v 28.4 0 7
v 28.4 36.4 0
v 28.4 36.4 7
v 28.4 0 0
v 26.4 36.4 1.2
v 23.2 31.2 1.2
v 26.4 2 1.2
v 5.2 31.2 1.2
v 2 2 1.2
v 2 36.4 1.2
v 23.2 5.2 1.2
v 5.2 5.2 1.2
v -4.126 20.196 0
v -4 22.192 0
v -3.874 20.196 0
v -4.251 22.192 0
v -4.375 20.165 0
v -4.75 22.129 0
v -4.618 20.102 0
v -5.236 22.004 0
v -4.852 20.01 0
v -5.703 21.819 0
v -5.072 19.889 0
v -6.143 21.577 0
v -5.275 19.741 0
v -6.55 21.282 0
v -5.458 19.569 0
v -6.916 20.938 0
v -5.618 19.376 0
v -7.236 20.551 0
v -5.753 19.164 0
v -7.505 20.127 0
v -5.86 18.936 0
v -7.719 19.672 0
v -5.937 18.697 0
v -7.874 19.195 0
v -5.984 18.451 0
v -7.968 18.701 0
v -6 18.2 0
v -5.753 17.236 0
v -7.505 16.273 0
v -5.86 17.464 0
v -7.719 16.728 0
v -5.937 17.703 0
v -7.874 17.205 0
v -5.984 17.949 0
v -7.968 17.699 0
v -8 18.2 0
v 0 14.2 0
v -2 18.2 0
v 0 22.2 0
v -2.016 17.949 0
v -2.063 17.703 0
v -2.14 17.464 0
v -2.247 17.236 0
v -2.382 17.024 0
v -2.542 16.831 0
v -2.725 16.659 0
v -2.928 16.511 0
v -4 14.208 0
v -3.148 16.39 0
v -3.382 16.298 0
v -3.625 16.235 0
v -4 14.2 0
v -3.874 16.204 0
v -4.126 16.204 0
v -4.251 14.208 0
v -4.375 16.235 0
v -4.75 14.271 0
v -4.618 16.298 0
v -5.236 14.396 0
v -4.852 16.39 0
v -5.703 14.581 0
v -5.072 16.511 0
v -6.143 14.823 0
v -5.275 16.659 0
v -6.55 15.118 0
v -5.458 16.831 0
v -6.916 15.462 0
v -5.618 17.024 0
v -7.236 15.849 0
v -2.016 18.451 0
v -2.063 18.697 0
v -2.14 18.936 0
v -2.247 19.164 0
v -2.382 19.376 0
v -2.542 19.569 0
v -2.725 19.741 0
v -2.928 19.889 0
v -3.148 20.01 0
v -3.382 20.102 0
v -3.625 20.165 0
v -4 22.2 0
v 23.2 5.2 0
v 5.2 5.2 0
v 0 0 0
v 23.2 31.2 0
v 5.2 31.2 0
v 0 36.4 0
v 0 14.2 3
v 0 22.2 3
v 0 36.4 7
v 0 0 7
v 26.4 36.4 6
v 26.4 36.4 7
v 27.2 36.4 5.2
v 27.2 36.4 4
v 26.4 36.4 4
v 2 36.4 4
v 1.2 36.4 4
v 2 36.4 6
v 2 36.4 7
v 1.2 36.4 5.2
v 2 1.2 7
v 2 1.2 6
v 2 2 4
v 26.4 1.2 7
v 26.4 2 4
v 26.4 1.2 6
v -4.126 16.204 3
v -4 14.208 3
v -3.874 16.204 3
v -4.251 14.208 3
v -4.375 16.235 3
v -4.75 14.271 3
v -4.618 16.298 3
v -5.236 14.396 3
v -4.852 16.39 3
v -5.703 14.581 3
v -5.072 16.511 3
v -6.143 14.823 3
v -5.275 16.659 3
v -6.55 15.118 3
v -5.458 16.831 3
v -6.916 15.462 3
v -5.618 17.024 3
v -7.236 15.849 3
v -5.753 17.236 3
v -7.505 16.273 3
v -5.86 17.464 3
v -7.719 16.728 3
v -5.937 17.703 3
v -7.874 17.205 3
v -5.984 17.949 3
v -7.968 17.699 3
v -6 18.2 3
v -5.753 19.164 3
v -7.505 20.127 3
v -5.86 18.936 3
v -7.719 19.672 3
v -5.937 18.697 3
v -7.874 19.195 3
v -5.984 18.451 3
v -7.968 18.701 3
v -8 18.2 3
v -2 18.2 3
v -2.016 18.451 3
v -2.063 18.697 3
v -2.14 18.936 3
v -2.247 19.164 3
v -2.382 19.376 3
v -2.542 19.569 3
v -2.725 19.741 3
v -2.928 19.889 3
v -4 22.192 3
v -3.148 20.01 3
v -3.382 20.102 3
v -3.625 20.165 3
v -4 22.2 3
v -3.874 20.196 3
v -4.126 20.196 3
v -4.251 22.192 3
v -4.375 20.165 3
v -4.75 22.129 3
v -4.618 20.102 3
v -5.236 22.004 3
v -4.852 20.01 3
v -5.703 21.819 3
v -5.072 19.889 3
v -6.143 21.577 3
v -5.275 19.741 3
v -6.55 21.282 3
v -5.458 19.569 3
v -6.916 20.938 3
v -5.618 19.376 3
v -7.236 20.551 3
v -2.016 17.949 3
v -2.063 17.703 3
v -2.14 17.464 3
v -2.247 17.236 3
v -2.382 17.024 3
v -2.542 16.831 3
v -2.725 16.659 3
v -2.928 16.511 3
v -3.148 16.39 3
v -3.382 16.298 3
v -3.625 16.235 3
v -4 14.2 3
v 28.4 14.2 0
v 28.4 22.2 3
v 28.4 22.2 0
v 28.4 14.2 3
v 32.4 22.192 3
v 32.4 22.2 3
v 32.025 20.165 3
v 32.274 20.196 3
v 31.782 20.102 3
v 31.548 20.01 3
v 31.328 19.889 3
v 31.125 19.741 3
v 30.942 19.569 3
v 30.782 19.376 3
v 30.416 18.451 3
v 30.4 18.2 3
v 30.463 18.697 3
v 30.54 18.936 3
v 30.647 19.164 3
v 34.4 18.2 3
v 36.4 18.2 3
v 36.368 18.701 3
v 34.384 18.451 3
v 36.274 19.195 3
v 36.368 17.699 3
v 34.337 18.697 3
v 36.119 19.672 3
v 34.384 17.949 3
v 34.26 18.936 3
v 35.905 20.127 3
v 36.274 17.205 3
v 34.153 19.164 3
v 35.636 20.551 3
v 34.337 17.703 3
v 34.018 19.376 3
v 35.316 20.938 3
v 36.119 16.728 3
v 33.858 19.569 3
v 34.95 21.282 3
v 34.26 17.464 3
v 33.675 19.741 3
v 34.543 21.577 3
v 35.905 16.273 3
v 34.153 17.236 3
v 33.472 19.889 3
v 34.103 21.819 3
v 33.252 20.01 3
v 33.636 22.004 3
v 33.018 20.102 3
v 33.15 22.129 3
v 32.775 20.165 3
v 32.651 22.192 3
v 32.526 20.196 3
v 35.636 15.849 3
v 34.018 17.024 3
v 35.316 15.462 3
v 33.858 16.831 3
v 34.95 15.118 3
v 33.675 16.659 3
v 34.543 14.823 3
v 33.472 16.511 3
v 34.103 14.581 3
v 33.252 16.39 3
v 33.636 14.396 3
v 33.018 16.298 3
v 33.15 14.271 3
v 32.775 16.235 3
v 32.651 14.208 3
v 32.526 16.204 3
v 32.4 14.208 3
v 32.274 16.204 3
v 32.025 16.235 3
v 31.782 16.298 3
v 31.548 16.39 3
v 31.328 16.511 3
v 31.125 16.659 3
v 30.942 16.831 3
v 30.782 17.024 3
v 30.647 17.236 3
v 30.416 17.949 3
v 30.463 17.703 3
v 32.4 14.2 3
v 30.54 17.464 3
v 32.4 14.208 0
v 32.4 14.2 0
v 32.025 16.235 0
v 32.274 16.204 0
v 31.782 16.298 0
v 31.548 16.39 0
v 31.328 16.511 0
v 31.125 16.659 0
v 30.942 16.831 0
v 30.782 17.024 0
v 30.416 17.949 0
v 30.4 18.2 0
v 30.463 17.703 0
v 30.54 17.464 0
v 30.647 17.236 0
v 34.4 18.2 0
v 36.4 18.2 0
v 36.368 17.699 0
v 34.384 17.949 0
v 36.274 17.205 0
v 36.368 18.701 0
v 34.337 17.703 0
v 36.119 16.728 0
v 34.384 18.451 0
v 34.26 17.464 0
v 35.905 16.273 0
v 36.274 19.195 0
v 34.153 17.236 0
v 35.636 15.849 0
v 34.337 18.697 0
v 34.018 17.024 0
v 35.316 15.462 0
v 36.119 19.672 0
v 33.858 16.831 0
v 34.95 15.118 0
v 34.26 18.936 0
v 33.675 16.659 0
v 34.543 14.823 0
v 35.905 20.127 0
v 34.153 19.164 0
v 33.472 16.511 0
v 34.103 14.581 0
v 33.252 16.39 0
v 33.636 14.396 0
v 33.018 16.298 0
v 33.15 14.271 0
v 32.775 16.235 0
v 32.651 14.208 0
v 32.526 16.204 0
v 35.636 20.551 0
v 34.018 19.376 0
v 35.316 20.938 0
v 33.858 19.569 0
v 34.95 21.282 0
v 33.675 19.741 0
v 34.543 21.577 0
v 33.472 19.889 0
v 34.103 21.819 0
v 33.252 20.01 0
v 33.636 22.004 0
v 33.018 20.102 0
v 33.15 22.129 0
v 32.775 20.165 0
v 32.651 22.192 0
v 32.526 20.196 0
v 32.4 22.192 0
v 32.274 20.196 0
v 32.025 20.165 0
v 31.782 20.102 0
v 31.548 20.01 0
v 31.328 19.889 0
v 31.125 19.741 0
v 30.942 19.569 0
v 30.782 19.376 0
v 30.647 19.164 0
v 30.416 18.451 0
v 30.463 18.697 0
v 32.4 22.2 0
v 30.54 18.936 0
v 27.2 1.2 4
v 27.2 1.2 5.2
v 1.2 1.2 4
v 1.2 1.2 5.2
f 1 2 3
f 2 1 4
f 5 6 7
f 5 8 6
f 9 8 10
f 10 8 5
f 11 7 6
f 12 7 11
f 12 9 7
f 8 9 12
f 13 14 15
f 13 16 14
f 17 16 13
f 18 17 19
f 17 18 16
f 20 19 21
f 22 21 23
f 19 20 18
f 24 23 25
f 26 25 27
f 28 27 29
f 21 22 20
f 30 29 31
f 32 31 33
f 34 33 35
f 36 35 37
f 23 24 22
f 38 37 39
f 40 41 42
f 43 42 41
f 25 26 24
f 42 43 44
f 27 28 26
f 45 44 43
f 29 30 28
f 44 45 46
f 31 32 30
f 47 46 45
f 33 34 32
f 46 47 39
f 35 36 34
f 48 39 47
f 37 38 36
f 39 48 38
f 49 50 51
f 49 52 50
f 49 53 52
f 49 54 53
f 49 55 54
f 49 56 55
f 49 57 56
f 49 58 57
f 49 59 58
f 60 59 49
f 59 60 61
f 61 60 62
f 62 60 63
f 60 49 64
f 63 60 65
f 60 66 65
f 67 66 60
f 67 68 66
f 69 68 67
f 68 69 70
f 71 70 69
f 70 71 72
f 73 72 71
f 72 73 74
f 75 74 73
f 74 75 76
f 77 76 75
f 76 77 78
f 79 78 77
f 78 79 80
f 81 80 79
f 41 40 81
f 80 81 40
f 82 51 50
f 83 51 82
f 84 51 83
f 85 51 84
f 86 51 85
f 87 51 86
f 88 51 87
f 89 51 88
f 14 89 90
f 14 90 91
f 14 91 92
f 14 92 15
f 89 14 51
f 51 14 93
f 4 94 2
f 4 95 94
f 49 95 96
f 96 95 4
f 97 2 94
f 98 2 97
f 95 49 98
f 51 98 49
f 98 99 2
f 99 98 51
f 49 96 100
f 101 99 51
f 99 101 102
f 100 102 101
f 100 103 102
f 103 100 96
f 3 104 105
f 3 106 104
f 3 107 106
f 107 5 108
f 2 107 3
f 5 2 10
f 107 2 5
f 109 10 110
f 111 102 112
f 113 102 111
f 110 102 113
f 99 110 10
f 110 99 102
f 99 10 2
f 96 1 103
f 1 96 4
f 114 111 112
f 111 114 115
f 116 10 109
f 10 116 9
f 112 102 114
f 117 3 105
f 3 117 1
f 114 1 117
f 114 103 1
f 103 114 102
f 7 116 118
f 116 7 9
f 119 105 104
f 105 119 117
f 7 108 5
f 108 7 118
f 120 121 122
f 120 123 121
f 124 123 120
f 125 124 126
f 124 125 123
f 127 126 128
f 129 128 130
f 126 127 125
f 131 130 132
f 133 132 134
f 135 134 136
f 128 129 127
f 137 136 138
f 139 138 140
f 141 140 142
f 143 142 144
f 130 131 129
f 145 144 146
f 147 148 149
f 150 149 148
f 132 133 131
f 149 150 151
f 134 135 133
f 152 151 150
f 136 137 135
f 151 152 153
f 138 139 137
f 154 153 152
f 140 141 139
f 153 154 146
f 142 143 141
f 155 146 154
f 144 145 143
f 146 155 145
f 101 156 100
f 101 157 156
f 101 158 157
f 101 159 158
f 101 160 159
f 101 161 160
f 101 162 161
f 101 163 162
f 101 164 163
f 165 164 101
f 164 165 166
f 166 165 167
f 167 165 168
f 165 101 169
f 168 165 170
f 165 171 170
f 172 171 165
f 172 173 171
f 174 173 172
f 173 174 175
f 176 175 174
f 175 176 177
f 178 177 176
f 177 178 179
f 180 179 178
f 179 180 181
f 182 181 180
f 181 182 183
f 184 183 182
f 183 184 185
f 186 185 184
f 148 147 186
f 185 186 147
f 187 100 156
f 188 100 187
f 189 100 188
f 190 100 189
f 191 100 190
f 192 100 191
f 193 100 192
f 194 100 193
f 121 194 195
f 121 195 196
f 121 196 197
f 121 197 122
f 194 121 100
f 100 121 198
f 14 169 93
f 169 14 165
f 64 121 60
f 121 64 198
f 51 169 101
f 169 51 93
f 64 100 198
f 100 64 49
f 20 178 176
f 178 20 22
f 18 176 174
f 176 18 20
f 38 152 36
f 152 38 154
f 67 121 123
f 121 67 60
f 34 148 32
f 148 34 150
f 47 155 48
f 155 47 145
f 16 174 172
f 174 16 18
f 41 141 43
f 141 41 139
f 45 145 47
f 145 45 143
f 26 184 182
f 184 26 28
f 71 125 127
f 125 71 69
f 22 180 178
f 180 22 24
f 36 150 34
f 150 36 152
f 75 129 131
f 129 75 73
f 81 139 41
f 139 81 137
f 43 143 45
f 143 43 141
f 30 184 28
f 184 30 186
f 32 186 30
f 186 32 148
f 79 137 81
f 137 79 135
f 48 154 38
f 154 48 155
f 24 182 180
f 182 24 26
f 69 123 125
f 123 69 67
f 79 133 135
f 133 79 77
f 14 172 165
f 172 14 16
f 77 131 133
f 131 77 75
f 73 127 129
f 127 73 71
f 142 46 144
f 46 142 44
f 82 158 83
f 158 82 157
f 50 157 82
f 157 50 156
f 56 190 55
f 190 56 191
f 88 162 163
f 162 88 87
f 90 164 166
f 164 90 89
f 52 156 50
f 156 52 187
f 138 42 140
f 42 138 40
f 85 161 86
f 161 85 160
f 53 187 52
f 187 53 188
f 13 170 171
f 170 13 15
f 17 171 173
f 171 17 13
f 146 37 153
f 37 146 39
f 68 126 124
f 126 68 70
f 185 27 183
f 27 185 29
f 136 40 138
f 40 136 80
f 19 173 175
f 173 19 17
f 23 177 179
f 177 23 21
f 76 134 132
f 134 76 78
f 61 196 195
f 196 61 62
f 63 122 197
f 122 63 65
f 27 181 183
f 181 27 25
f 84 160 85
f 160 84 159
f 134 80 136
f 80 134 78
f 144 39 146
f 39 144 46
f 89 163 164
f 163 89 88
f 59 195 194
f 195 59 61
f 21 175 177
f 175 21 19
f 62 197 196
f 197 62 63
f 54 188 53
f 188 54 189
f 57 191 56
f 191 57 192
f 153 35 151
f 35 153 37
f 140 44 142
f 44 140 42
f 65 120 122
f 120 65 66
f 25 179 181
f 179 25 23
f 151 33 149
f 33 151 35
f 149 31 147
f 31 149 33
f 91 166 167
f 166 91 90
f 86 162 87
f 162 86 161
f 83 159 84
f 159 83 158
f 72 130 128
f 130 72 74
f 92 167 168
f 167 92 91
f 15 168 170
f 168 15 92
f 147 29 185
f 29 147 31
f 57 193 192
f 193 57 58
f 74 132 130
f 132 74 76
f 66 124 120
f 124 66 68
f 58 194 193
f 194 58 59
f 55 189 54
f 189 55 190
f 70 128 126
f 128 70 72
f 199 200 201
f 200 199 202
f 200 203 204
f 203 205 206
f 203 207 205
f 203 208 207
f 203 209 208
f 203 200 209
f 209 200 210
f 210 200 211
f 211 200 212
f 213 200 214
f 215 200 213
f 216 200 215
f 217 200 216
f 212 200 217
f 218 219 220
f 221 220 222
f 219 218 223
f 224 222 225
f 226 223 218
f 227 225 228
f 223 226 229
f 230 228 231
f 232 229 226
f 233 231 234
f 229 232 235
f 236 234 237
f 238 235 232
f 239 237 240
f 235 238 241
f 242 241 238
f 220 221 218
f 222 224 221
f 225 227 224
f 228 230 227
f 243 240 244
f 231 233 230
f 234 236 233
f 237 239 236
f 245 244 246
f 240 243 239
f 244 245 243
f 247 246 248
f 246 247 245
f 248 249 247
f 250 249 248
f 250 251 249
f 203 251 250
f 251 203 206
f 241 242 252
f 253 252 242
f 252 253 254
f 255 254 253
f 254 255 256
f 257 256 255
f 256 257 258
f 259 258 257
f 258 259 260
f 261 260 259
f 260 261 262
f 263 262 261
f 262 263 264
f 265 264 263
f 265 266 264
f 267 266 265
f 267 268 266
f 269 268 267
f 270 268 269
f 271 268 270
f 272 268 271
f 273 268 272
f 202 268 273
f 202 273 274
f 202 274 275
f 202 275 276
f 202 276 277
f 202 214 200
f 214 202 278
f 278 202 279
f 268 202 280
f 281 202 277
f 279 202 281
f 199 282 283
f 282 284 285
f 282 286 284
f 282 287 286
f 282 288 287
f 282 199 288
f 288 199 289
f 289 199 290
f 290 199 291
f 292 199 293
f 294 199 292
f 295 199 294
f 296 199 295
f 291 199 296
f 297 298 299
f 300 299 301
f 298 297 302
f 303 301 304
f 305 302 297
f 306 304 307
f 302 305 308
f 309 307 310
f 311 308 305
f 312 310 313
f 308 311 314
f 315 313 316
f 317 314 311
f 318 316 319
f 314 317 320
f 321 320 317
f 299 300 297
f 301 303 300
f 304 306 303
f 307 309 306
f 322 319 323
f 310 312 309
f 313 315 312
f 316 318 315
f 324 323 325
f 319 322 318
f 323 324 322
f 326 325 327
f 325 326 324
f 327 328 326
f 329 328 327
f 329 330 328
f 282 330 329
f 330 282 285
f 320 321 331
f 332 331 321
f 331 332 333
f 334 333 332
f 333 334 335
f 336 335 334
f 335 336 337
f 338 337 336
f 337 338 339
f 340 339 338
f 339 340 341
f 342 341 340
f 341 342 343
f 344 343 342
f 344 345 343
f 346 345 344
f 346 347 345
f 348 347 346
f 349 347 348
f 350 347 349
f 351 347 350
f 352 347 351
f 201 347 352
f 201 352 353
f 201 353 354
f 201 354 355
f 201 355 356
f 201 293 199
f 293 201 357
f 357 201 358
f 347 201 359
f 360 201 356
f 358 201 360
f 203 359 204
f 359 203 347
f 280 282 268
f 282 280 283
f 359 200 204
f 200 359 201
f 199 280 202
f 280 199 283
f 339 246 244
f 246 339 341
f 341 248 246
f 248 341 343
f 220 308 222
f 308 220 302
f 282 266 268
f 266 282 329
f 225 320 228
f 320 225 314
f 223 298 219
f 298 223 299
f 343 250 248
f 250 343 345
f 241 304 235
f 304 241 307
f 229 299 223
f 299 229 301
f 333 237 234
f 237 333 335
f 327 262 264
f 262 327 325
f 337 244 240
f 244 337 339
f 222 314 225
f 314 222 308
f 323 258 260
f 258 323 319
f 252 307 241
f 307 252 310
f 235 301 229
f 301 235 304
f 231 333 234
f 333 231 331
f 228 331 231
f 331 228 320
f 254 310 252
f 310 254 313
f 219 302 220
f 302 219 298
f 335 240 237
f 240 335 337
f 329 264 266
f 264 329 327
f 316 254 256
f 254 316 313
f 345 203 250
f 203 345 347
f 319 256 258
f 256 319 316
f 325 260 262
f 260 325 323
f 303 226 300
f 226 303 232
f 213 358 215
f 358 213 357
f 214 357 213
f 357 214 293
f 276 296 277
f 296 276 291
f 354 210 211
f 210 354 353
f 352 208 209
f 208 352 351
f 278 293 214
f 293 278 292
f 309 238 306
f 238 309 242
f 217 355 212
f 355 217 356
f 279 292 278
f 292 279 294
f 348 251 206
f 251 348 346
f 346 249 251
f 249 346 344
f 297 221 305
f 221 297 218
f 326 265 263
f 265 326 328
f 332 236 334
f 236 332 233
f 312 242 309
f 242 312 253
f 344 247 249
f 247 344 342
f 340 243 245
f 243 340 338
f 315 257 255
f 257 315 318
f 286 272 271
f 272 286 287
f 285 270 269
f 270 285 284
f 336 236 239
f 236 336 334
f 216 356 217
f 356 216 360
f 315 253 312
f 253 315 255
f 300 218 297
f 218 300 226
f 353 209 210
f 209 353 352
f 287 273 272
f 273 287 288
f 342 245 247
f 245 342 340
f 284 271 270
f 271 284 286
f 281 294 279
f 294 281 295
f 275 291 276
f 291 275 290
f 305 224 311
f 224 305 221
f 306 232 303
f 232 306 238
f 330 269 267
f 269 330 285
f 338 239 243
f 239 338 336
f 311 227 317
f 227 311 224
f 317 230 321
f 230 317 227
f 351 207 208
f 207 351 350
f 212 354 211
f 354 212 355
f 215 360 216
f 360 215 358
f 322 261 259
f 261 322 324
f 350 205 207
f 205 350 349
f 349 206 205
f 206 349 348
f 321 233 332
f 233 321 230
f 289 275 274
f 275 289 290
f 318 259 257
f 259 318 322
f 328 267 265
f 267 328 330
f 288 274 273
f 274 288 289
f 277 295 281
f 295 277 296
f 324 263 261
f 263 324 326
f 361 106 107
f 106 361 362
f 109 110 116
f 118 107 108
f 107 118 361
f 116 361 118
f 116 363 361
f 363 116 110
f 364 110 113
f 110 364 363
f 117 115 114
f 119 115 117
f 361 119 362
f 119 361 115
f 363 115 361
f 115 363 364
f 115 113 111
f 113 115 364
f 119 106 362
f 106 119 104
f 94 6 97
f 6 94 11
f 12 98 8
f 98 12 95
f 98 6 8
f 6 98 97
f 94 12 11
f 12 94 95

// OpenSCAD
// file: ../lib/pcb_led_cvf.scad
// for led power module modified

/* bluetooth_mate_holder.scad
 * By John Biehler - November 17, 2011
 * http://www.thingiverse.com/thing:

 * derived from pcb_box_slide_with_tabs.scad
 * By Nicholas C Lewis - Jan 1, 2011
 * http://www.thingiverse.com/thing:5396
 *
 * derived from pcb_box_slide.scad
 *     Parametric, open PCB-box (slide-in) by chlunde
 *     http://www.thingiverse.com/thing:4071
 *
 * CHANGES
 * - adjusted to fit Arduino Mega
 * - added mounting tabs
 * - turned off cutouts
 * - adjusted bottom cutout size
 */

$fn=50;

module pcb_led_cvf(

	pcb_width = 48.2,
	pcb_length =24.1,
	pcb_height =1.1,
	slisse = 0.8,

	pcb_bottom_margin = 1,
	wall_width_thick = 2,
	box_height = 7,

	//tab parameters
	tab_hole_radius=2,
	tab_outer_radius=4,

	inner_margin = 4,

	add_tabs = true

) {
	wall_width = wall_width_thick-slisse;

module tab() {
	difference(){
		union() {
			translate([-tab_outer_radius,-tab_outer_radius,0])
			cube([tab_outer_radius,2*tab_outer_radius,wall_width_thick+1]);
			translate([-tab_outer_radius,0,0])
				cylinder(r=tab_outer_radius, h = wall_width_thick+1);
		}
		translate([-tab_outer_radius,0,0]) {
			cylinder(r= tab_hole_radius, h = wall_width_thick+5,center=true);
		}
	}

}

module box() {
	union() {
		cube([pcb_width + 2*wall_width, pcb_length + 2*wall_width, wall_width]);

		cube([wall_width_thick, pcb_length + 2*wall_width, box_height]);

		cube([pcb_width + 2*wall_width, wall_width_thick, box_height]);

		%translate([0, pcb_length+wall_width, 0])
			cube([pcb_width + 2*wall_width,wall_width,box_height]);

		translate([pcb_width + wall_width - slisse,0,0])
			cube([wall_width_thick, pcb_length + 2*wall_width, box_height]);
	}
	if(add_tabs) {
//comment out this part to remove tabs
		for(i=[(pcb_length + 2*wall_width)/2]){
	translate([0,i,0])tab();
	translate([pcb_width + 2*wall_width,i,0])mirror()tab();
		}
	}

}

module pcb() {
	translate([wall_width, wall_width, wall_width + pcb_bottom_margin])
		cube([pcb_width,pcb_length + wall_width + 0.1,pcb_height]);
	translate([wall_width, wall_width, wall_width + pcb_bottom_margin+pcb_height])rotate([0,45,0])
		cube([pcb_height,pcb_length + wall_width + 0.1,pcb_height]);
	translate([wall_width+pcb_width-2*cos(45)*pcb_height, wall_width, wall_width + pcb_bottom_margin+pcb_height])rotate([0,45,0])
		cube([pcb_height,pcb_length + wall_width + 0.1,pcb_height]);
	translate([wall_width_thick, wall_width, wall_width + pcb_bottom_margin])
		cube([pcb_width-2*slisse,pcb_length + wall_width + 0.1,box_height]);

}



module holes() {
		*translate([wall_width + pcb_width/2, wall_width_thick + 0.1, pcb_width/2+wall_width])
			rotate(a=90,v=[1,0,0])
				cylinder(r=pcb_width/2, h=wall_width_thick + 0.2);

		*translate([-0.1, wall_width + pcb_length/2, pcb_length/2 + wall_width])
			rotate(a=90,v=[0,1,0])
				cylinder(r=pcb_length/2, h=wall_width_thick + 0.2);

		*translate([pcb_width + wall_width - slisse - 0.1, wall_width + pcb_length/2, pcb_length/2 + wall_width])
			rotate(a=90,v=[0,1,0])
				cylinder(r=pcb_length/2, h=wall_width_thick + 0.2);

	 * translate([pcb_width/2 + wall_width, wall_width + pcb_length/2, -0.1])
			rotate(a=0,v=[0,1,0])
				cylinder(r=min(pcb_length,pcb_width)/2 - wall_width/2, h=wall_width_thick + 0.2);

		translate([inner_margin +wall_width, inner_margin+wall_width, -0.1])
			cube([pcb_width-inner_margin*2,pcb_length -inner_margin*2,wall_width + 0.2]);
}

	difference() {
		box();
		pcb();
		holes();
	}
}



pcb_led_cvf();
// main file
use <../lib/pcb_led_cvf.scad>

$fn = 50;

pcb_led_cvf(
  pcb_length=34,
  pcb_width=26,
  pcb_height=1.2,
  pcb_bottom_margin=2.8
);
